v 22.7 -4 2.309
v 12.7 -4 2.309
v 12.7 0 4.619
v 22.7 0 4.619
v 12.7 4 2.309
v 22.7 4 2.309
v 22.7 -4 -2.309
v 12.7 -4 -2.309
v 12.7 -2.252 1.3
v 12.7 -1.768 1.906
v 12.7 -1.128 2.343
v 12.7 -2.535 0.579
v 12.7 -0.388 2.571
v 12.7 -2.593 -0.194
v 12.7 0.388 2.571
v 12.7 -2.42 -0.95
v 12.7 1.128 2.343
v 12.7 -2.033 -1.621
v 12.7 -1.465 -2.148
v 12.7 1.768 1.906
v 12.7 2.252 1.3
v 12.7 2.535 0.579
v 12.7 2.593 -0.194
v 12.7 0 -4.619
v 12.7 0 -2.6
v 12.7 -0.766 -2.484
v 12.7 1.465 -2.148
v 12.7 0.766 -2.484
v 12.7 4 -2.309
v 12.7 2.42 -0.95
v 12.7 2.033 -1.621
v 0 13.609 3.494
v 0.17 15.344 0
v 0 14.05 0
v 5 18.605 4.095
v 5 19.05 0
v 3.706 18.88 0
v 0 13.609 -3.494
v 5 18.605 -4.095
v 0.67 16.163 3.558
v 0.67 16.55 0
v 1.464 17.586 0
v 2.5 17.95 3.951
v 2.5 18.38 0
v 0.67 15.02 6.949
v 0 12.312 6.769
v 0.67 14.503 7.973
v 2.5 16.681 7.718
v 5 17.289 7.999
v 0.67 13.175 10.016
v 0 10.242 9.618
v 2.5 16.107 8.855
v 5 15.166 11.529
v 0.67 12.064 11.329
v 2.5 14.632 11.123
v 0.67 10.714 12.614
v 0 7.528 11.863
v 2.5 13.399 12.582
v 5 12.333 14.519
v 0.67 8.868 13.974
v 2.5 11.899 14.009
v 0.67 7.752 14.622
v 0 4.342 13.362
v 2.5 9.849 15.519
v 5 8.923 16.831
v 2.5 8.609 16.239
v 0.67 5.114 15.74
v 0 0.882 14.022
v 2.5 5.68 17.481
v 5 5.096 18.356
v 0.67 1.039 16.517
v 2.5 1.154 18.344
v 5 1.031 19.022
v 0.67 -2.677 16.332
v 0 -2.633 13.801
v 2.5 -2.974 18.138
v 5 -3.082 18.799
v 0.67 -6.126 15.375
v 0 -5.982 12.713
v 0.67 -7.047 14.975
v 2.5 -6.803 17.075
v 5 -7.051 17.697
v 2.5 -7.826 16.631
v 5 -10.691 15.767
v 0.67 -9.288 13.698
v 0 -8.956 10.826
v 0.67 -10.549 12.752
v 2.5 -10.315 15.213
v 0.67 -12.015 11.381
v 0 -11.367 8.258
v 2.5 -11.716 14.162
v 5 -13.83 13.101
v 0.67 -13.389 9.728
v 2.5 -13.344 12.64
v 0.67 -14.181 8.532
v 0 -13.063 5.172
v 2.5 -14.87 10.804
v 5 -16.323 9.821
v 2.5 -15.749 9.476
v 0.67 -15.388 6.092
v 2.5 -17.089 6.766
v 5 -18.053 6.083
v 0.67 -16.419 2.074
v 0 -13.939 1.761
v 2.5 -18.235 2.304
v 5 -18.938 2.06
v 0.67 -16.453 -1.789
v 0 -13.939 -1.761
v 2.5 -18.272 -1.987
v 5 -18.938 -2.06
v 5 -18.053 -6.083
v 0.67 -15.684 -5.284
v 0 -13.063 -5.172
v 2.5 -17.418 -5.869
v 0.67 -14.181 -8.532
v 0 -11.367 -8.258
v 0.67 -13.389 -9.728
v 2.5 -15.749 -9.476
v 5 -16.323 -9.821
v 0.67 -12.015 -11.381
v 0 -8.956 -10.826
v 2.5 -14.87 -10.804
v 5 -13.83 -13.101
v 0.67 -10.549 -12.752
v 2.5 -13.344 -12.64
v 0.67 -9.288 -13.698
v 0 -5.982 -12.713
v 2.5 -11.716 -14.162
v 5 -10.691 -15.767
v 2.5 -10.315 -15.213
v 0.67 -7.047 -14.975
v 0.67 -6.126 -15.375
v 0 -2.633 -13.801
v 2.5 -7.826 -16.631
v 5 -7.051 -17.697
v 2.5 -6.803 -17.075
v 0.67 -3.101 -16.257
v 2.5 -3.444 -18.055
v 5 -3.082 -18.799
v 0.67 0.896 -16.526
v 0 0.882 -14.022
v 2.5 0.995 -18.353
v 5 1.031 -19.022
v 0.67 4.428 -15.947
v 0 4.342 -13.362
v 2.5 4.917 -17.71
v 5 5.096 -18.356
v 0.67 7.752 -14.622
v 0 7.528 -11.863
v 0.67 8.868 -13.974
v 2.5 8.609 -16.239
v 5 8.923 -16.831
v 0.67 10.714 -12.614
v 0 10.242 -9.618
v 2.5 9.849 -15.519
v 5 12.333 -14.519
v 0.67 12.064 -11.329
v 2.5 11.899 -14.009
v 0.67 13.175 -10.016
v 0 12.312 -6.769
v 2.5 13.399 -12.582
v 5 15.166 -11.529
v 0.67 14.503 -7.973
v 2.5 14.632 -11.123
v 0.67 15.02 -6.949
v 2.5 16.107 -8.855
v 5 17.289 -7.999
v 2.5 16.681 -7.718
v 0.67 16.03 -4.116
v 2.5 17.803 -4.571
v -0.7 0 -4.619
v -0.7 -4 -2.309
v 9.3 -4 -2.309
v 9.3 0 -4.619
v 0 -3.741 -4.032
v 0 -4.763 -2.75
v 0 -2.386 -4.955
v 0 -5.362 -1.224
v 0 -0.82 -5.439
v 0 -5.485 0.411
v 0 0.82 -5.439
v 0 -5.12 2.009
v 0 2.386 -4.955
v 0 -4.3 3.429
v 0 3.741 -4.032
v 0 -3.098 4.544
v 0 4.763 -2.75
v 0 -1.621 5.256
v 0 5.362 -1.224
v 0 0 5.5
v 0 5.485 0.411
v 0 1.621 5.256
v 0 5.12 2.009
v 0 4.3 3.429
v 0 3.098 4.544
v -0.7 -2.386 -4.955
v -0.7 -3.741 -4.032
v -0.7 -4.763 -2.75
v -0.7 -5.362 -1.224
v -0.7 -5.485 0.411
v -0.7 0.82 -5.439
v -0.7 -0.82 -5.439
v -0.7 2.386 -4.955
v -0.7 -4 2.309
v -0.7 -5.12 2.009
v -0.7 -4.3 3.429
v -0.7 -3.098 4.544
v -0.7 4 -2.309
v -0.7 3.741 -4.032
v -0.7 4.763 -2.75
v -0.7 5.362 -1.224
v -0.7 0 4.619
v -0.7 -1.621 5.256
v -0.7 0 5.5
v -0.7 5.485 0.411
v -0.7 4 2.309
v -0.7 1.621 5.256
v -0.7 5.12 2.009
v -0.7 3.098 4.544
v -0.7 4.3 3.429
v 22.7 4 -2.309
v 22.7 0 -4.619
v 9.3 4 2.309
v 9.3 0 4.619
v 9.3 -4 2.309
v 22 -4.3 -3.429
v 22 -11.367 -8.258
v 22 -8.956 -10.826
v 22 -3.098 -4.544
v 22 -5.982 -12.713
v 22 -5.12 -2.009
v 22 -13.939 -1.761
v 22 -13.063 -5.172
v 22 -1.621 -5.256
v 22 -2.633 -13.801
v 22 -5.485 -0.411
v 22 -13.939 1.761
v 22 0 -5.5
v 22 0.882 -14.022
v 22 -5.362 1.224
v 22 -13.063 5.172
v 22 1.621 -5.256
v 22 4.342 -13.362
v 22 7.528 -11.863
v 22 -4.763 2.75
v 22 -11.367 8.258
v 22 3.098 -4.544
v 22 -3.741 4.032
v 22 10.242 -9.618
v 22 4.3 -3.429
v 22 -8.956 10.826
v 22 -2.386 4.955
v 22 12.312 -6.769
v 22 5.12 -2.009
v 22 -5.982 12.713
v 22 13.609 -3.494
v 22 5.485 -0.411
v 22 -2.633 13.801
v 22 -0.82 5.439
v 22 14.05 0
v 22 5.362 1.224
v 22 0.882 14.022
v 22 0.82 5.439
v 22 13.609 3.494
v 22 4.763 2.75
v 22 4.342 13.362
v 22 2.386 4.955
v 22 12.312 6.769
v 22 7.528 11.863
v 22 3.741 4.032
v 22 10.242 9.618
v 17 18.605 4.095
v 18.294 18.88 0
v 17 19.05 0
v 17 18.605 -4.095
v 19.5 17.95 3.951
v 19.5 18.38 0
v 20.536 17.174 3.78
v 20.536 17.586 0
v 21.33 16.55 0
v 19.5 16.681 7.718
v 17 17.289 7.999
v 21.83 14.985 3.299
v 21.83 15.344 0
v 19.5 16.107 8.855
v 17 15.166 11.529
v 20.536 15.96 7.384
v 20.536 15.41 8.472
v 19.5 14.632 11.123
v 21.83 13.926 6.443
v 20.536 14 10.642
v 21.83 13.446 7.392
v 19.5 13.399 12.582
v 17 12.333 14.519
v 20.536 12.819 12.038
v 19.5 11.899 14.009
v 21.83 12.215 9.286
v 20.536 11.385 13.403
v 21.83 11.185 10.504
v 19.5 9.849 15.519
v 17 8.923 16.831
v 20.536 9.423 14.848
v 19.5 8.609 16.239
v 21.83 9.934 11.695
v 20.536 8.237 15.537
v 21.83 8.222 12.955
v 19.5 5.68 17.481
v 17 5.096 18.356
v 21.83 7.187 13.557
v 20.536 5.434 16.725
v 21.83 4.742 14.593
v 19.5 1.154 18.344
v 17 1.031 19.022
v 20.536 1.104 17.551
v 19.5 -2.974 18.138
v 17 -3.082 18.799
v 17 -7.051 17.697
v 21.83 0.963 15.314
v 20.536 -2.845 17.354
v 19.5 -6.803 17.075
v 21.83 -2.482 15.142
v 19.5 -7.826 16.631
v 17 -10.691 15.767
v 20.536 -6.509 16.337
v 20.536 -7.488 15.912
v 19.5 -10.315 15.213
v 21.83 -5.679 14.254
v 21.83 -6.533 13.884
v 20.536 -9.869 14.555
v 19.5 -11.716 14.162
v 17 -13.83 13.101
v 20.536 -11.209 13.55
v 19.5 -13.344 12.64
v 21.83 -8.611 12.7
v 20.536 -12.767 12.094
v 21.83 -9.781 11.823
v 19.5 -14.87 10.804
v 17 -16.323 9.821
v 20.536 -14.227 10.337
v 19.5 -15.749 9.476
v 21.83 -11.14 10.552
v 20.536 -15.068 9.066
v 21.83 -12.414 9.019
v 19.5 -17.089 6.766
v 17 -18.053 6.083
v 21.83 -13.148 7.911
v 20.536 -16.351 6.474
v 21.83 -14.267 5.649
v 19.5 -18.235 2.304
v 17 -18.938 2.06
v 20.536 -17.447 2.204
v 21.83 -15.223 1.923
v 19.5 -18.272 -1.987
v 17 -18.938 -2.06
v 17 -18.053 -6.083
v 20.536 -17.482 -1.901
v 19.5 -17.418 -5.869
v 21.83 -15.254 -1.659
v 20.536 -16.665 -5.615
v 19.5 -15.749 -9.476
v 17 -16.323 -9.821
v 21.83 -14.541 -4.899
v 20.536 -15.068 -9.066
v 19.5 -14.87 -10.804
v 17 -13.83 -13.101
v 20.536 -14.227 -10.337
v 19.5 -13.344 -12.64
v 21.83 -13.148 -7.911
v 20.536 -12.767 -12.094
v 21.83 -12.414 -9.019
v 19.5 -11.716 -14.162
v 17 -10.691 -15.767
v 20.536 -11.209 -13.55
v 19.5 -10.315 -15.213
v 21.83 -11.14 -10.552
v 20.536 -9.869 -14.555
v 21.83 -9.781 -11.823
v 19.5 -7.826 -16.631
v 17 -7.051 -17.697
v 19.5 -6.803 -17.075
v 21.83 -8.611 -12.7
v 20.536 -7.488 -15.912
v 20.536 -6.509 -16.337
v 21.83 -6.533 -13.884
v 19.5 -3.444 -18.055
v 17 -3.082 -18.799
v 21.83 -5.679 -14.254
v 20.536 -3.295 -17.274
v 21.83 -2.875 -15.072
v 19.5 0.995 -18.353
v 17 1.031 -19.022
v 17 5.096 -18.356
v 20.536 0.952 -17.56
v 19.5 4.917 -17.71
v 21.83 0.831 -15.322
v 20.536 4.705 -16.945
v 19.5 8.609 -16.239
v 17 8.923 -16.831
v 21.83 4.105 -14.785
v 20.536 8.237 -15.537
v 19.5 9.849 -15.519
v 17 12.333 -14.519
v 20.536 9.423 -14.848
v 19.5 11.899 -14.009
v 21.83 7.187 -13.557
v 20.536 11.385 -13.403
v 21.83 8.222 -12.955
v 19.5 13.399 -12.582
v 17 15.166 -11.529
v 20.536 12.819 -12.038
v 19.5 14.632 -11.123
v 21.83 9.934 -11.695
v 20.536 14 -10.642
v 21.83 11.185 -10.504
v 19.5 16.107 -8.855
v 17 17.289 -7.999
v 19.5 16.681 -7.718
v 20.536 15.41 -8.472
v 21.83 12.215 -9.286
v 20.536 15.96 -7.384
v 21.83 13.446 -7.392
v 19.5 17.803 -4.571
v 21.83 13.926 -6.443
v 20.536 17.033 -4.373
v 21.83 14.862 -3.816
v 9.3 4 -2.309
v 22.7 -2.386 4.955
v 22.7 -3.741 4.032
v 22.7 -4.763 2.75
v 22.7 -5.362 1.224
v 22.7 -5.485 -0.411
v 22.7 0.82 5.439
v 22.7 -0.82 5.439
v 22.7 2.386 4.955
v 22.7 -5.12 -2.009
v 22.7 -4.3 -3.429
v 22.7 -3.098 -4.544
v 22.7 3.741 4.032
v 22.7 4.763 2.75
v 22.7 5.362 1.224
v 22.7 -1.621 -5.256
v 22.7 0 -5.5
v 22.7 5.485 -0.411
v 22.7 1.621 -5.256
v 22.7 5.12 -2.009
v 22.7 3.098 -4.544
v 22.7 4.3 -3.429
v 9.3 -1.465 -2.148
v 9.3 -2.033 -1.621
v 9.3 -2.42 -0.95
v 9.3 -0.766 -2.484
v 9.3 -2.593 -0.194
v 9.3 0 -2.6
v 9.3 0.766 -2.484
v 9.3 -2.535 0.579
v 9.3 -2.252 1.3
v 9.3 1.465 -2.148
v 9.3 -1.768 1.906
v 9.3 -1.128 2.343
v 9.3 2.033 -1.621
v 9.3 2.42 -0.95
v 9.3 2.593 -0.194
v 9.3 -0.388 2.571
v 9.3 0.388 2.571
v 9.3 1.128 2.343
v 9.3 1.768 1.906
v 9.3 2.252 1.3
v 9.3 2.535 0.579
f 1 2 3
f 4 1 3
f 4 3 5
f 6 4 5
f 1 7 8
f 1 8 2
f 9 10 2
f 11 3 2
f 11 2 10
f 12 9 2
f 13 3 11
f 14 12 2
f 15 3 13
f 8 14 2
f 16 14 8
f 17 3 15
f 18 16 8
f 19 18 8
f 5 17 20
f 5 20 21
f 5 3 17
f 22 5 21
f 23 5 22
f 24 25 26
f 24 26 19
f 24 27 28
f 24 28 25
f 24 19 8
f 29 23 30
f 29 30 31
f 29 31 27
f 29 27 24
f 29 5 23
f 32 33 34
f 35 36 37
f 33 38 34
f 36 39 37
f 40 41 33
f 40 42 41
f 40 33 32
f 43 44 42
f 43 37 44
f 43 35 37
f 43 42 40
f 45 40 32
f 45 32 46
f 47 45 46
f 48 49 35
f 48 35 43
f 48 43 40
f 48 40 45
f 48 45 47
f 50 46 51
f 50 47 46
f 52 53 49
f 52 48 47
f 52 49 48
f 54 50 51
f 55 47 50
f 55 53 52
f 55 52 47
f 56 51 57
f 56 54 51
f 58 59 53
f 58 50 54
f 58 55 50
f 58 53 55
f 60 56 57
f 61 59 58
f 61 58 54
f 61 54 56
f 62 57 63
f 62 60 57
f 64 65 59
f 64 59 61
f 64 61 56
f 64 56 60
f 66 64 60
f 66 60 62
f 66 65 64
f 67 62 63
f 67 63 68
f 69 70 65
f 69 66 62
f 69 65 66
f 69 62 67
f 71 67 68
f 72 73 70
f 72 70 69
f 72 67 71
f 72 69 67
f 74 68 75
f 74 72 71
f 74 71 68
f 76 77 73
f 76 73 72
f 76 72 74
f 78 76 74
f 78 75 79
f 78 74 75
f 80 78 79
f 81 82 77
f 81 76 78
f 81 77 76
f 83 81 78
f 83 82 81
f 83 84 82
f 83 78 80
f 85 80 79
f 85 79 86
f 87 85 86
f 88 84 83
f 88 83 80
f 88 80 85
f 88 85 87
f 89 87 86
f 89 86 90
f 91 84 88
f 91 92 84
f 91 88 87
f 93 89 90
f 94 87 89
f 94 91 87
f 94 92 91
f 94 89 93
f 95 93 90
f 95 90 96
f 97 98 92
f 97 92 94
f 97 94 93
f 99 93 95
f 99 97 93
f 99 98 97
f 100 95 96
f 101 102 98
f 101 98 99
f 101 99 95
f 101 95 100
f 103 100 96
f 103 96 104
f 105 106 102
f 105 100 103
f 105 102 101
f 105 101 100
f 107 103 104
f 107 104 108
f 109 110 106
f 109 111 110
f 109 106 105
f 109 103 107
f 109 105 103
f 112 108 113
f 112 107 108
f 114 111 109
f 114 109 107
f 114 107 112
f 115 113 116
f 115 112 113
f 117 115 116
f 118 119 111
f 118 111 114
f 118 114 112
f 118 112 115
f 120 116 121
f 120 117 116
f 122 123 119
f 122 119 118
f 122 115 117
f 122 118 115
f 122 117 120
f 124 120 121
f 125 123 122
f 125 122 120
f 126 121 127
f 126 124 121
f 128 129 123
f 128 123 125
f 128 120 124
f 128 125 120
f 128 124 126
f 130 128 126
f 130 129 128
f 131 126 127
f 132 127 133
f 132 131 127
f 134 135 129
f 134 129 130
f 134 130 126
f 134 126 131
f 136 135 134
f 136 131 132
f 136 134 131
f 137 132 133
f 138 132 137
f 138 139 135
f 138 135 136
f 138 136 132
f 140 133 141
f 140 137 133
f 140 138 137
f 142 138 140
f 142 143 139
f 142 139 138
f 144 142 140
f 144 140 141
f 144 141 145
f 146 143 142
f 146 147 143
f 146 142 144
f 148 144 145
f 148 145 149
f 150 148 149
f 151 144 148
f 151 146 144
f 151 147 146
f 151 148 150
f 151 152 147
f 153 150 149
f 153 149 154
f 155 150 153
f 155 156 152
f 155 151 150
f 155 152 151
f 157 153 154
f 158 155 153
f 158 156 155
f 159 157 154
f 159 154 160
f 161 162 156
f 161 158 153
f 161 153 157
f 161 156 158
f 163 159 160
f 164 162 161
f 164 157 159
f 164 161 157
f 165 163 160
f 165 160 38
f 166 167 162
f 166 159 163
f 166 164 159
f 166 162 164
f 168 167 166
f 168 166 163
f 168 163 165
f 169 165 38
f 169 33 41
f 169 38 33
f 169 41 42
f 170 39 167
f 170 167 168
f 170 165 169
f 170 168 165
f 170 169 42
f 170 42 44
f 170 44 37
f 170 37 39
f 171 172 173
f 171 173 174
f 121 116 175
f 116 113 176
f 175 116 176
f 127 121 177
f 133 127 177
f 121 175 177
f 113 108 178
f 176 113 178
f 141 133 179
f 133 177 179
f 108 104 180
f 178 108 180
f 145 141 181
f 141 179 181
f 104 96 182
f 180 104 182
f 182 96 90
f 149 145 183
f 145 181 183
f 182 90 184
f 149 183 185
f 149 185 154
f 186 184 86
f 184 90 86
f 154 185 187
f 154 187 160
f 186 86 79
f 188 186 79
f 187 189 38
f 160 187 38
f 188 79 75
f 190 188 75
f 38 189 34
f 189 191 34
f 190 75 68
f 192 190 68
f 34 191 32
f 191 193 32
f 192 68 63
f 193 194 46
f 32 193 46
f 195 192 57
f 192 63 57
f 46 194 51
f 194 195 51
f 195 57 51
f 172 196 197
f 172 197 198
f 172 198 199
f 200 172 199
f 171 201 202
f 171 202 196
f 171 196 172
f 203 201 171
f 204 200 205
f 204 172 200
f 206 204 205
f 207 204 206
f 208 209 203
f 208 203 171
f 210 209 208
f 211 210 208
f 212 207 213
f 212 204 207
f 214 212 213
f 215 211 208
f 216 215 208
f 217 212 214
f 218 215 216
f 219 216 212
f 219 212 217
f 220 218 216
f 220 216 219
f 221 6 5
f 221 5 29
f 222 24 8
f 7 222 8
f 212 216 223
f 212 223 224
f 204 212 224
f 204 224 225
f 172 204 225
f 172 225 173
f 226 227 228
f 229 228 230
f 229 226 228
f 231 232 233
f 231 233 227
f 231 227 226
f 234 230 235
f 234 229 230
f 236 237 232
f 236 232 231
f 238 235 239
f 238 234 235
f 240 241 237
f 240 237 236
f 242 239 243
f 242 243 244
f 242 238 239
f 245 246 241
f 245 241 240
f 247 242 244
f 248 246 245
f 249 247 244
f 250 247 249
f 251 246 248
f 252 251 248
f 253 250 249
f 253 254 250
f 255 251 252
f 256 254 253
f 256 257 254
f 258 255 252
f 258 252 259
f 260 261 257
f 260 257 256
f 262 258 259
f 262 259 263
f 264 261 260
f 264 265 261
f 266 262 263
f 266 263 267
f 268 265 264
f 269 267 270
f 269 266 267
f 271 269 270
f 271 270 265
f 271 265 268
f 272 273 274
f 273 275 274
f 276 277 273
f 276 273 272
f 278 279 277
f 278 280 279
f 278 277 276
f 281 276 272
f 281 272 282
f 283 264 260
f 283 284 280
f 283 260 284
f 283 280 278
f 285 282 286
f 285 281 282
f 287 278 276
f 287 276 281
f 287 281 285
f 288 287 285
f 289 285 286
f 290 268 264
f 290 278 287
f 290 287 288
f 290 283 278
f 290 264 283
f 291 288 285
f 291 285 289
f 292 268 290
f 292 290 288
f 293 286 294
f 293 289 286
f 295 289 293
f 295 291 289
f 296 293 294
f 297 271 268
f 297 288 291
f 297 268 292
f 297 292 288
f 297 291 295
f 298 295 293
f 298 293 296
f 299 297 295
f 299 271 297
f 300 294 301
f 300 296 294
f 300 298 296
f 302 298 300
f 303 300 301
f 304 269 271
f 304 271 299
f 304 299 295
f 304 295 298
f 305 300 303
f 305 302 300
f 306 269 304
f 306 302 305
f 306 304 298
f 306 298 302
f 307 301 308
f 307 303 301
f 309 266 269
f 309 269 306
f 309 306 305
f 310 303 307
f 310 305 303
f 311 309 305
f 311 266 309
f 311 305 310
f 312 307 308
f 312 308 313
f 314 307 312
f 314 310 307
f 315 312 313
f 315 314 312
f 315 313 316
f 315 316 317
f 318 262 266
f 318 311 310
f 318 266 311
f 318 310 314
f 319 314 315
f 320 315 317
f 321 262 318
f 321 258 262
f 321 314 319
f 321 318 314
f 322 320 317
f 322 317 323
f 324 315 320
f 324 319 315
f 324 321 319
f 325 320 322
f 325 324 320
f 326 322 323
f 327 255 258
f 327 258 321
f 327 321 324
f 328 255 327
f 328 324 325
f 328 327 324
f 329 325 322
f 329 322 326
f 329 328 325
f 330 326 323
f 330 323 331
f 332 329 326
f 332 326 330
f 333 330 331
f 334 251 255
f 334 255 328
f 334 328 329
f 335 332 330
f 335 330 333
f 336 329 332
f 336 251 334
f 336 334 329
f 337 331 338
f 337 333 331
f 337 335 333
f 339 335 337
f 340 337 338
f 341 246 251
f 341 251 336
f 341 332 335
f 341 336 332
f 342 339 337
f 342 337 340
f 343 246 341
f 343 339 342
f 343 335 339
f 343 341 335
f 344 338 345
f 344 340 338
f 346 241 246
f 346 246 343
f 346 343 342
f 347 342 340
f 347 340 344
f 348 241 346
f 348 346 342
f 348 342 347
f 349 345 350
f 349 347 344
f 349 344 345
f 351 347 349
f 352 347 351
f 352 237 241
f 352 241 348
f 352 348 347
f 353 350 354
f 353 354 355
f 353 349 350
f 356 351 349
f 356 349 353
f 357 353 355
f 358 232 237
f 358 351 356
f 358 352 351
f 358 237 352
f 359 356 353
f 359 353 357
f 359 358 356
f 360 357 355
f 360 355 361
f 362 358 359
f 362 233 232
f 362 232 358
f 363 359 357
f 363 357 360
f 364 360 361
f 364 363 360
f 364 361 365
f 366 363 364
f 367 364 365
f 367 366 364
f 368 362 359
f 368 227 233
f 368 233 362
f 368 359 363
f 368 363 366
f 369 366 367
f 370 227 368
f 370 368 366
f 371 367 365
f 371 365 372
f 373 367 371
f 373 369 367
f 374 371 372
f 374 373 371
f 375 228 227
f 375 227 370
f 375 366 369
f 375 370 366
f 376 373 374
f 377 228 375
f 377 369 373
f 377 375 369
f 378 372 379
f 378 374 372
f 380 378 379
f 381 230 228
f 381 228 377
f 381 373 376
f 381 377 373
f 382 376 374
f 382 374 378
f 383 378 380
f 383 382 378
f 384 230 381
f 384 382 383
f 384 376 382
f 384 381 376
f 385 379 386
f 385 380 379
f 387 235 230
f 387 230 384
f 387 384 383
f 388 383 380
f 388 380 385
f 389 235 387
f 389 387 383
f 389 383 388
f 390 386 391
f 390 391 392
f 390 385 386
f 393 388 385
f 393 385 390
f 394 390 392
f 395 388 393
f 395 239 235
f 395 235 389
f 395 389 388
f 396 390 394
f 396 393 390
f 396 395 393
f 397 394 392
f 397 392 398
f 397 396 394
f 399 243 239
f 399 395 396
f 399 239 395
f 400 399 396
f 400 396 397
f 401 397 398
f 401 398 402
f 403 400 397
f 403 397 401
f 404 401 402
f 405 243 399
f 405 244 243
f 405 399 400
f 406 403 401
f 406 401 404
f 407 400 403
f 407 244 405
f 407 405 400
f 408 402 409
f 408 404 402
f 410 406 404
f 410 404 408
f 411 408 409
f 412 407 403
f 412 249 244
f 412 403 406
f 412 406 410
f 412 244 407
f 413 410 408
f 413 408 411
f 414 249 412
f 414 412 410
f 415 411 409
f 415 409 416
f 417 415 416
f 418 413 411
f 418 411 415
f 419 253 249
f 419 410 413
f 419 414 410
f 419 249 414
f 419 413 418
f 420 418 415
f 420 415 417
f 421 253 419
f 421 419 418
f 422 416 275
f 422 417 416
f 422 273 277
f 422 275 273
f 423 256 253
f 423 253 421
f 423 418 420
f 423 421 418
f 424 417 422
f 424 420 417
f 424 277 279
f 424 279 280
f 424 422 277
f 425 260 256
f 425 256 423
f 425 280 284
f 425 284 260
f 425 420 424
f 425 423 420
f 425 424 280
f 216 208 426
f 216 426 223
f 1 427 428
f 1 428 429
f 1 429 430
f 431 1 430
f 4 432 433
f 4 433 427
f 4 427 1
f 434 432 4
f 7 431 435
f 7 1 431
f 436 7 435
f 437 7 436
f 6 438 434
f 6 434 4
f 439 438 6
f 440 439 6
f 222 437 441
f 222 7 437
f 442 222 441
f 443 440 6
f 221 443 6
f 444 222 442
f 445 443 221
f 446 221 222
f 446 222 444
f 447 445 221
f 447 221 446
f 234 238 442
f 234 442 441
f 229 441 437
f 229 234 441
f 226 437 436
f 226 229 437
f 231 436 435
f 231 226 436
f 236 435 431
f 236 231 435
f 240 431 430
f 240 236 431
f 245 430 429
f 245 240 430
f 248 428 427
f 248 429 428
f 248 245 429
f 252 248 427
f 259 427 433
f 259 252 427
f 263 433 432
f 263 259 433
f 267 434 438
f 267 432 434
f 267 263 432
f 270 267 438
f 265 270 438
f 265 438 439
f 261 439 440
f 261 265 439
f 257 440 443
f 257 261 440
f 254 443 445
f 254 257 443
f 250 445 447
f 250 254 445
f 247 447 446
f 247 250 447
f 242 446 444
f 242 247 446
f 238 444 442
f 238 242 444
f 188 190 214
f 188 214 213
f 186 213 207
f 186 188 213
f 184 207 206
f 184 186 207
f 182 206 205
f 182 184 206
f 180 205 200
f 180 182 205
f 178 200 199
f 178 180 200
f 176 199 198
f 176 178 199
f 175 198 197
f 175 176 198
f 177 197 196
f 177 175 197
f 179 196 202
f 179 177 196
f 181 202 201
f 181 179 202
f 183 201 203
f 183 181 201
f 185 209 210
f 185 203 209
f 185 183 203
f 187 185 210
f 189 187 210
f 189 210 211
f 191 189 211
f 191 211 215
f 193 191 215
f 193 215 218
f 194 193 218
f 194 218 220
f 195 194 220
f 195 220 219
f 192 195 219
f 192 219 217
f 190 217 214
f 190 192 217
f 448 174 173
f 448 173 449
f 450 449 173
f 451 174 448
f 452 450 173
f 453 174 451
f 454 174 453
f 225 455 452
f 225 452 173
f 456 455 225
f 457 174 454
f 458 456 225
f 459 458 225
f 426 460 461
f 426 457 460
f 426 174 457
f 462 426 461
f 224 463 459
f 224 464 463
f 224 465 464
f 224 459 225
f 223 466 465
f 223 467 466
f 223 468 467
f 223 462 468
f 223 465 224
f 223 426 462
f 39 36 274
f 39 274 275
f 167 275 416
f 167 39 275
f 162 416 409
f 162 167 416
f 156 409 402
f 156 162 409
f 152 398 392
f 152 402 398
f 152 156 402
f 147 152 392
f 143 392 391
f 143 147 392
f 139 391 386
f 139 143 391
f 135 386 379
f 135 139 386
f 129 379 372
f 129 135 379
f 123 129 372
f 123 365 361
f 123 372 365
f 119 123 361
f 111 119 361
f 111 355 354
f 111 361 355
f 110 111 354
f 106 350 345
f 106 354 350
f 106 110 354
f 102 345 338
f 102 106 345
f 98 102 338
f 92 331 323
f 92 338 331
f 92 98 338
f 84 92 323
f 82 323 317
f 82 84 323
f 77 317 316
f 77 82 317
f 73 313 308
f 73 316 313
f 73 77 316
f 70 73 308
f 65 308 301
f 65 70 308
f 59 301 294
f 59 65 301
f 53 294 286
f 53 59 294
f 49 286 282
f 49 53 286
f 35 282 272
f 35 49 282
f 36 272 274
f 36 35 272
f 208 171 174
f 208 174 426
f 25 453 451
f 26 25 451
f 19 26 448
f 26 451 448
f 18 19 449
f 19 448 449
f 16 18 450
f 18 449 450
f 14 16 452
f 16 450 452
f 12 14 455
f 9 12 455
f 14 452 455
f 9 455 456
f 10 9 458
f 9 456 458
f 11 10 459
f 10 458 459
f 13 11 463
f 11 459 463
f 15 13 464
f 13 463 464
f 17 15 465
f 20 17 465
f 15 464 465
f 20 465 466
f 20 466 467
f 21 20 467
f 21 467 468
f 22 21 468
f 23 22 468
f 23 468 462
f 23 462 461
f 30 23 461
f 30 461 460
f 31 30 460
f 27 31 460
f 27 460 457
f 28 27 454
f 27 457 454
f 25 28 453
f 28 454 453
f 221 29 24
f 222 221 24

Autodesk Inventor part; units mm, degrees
ref_plane "YZ Plane" through (0, 0, 0) normal (1, 0, 0) x (0, 1, 0)
ref_plane "XZ Plane" through (0, 0, 0) normal (0, 1, 0) x (-1, 0, 0)
ref_plane "XY Plane" through (0, 0, 0) normal (0, 0, 1) x (1, 0, 0)
sketch "スケッチ1" plane through (0, 0, 0) normal (1, 0, 0) x (0, 1, 0)
  circle A0 centre (0, 0) radius 19.05
  dimension "d0" = 38.1
extrude "押し出し1" add sketch "スケッチ1" along normal blind 22
hole "穴1" at (22, 0, 0) direction (-1, 0, 0) diameter 5.2 end through all
sketch "スケッチ2" plane through (22, 0, 0) normal (1, 0, 0) x (0, 0, -1)
  circle A0 centre (0, 0) radius 5.5
  dimension "d12" = 11
extrude "押し出し2" add sketch "スケッチ2" along normal blind 0.7
sketch "スケッチ3" plane through (0, 0, 0) normal (-1, 0, 0) x (0, 0, 1)
  circle A0 centre (0, 0) radius 5.5
  dimension "d15" = 11
extrude "押し出し3" add sketch "スケッチ3" along normal blind 0.7
fillet "フィレット1" radius 5 1 edges at (0, -19.05, 0)
fillet "フィレット2" radius 5 1 edges at (22, -19.05, 0)
sketch "スケッチ4" plane through (-0.7, 0, 0) normal (-1, 0, 0) x (0, 0, 1)
  line L0 (-2.3094, -4) -> (-4.6188, 0)
  line L1 (-4.6188, 0) -> (-2.3094, 4)
  line L2 (-2.3094, 4) -> (2.3094, 4)
  line L3 (2.3094, 4) -> (4.6188, 0)
  line L4 (4.6188, 0) -> (2.3094, -4)
  line L5 (2.3094, -4) -> (-2.3094, -4)
  point P0 (0, 0)
  point P1 (0, 0)
  point P2 (0, -4)
sketch "スケッチ5" plane through (22.7, 0, 0) normal (1, 0, 0) x (0, 0, -1)
  line L0 (2.3094, 4) -> (4.6188, 0)
  line L1 (4.6188, 0) -> (2.3094, -4)
  line L2 (2.3094, -4) -> (-2.3094, -4)
  line L3 (-2.3094, -4) -> (-4.6188, 0)
  line L4 (-4.6188, 0) -> (-2.3094, 4)
  line L5 (-2.3094, 4) -> (2.3094, 4)
  point P0 (0, 0)
  point P1 (0, 0)
  point P2 (0, 4)
extrude "押し出し4" cut sketch "スケッチ4" against normal blind 10
extrude "押し出し5" cut sketch "スケッチ5" against normal blind 10
properties part number "38omuni14184"
